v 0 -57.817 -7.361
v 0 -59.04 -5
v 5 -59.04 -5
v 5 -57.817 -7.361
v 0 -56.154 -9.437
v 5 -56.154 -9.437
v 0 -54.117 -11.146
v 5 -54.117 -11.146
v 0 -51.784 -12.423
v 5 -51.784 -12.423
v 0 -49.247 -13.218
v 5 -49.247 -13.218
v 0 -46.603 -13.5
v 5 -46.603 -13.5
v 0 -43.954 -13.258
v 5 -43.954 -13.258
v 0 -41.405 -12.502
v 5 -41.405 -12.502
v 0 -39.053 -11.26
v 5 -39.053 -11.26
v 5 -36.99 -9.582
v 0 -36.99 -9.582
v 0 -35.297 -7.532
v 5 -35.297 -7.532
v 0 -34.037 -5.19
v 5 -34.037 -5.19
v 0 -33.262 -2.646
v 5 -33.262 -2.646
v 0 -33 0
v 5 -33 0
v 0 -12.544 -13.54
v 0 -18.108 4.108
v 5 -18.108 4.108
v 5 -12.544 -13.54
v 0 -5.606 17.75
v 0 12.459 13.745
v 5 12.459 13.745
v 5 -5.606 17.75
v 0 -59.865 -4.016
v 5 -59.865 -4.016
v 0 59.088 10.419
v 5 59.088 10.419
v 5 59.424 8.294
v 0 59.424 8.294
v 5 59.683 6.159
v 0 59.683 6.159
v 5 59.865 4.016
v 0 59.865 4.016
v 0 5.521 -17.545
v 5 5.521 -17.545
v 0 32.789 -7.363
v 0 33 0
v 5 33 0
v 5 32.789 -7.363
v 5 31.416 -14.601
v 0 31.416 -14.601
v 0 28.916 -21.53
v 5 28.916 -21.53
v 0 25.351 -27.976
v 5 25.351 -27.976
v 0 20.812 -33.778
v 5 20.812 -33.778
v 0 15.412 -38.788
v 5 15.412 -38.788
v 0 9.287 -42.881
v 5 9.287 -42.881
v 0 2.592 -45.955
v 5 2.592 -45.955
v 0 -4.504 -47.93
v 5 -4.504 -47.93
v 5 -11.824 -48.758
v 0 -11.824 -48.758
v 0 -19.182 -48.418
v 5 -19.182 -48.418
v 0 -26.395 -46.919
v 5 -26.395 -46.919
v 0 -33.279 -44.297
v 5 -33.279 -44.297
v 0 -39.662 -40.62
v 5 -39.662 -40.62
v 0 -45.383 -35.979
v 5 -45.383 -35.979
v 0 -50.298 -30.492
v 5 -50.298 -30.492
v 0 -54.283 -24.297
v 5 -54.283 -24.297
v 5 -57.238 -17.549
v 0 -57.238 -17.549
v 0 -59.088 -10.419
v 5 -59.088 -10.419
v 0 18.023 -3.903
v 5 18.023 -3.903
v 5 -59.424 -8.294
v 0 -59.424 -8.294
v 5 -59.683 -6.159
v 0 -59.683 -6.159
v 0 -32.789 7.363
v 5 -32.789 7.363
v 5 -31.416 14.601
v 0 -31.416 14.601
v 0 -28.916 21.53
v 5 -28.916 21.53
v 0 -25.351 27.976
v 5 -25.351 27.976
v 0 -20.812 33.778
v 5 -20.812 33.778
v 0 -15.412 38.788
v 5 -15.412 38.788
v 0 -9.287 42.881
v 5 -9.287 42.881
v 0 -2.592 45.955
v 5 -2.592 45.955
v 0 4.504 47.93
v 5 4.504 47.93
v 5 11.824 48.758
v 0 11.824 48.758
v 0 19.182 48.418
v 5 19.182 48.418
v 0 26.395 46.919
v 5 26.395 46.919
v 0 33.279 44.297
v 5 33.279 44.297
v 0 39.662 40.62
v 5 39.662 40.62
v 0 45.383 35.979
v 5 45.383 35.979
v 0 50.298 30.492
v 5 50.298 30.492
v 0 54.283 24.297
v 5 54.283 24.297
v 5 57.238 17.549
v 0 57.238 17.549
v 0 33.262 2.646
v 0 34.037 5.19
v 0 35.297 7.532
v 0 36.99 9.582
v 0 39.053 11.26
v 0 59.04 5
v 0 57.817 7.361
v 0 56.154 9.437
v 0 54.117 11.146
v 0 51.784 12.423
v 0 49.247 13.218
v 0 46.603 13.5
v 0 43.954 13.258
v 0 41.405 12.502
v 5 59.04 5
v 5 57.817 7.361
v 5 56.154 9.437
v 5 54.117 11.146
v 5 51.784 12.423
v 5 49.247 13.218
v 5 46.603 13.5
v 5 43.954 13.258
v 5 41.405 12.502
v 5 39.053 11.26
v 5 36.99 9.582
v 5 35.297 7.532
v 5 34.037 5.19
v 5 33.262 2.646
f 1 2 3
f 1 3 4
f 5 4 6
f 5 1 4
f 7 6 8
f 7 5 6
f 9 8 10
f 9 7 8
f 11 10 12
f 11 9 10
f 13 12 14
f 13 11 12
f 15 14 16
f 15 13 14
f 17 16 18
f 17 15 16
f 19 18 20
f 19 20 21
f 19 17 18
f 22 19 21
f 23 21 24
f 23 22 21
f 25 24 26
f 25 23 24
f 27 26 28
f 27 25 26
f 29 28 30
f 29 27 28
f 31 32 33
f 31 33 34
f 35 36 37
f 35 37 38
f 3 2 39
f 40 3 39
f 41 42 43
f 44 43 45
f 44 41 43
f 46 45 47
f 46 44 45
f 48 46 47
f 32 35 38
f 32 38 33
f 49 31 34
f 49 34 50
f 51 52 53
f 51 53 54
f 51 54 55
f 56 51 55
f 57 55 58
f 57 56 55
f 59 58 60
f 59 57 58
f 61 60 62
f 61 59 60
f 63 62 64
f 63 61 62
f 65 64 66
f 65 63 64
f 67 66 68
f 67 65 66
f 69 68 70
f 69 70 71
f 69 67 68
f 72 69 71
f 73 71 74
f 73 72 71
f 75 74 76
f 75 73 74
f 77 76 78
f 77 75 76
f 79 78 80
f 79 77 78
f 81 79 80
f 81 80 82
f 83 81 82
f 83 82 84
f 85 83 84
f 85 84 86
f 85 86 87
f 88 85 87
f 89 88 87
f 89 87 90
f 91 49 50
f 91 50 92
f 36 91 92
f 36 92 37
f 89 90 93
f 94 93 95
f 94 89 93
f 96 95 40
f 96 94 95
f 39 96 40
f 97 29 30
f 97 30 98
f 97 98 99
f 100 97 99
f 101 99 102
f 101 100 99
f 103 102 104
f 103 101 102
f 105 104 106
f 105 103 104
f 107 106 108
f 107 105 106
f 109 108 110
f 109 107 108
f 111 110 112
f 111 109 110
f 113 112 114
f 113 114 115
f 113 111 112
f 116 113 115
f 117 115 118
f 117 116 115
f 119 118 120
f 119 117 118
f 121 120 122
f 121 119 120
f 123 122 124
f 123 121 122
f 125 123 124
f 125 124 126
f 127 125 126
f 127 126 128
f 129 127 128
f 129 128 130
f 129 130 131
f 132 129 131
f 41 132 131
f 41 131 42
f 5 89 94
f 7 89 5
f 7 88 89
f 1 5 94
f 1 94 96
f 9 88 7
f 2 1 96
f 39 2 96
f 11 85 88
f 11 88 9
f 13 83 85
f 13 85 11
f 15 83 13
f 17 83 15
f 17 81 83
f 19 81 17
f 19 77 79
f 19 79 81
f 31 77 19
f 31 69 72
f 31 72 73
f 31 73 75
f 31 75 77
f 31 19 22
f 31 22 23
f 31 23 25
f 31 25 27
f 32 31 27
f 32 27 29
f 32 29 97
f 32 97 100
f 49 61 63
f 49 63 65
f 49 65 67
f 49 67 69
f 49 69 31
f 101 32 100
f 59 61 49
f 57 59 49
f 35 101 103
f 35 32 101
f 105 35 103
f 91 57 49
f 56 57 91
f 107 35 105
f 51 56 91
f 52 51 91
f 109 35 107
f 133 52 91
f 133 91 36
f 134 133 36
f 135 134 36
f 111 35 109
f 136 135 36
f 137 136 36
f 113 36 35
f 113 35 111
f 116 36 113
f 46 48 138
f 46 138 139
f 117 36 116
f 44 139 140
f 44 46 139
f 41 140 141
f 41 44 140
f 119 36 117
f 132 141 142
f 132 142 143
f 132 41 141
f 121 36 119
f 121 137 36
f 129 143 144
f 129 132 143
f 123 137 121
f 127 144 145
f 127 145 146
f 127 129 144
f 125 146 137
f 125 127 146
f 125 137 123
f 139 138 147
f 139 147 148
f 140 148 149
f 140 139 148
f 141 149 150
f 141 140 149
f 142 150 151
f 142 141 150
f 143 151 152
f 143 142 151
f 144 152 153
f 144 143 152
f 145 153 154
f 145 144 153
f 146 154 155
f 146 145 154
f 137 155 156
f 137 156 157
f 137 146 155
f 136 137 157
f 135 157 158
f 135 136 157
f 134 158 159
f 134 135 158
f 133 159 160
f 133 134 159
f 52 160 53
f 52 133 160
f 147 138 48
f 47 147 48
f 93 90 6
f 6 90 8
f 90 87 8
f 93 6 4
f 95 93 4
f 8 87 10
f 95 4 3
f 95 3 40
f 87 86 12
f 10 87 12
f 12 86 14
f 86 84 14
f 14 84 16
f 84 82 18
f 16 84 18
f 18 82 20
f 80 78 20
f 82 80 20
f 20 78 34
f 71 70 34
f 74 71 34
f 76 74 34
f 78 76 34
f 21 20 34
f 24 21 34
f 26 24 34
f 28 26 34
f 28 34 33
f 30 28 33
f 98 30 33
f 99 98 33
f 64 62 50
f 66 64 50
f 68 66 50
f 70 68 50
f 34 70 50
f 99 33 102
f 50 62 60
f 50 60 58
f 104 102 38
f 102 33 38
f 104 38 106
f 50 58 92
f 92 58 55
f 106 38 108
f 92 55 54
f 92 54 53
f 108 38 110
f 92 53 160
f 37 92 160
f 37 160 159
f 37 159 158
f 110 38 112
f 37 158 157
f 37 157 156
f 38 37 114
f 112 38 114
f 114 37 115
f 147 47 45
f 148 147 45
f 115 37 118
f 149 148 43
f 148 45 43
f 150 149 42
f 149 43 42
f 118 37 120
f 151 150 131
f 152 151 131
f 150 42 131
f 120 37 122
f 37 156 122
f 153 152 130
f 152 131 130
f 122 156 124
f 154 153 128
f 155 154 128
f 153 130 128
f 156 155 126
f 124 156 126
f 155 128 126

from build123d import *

# Parameters (mm, degrees)
BOSS_EXTRUDE1_DEPTH = 5
CUT_EXTRUDE1_DEPTH  = 6
CAVITY1_DEPTH       = 5


# Read off the part's stored shape, not the designer's step: Cavity1
with BuildPart() as part:
    # Sketch3 → Boss-Extrude1 (new body)
    with BuildSketch(Plane(origin=(0, 0, 0), x_dir=(0, 0, -1), z_dir=(1, 0, 0))):
        with BuildLine():
            ThreePointArc((0, 60), (-13.5, 46.5), (0, 33))
            ThreePointArc((0, 33), (48.489461609, -8.147530745), (10.41889066, -59.088465181))
            ThreePointArc((10.41889066, -59.088465181), (5.229344565, -59.771681886), (0, -60))
            ThreePointArc((0, -60), (13.5, -46.5), (0, -33))
            ThreePointArc((0, -33), (-48.489461609, 8.147530745), (-10.41889066, 59.088465181))
            ThreePointArc((-10.41889066, 59.088465181), (-5.229344565, 59.771681886), (0, 60))
        make_face()
    extrude(amount=BOSS_EXTRUDE1_DEPTH)

    # Sketch5 → Cut-Extrude1 (cut)
    with BuildSketch(Plane(origin=(0, 0, 0), x_dir=(0, 0, -1), z_dir=(1, 0, 0))):
        Polygon((-5, 59.039936204), (0, 63.23543436), (4.195498156, 58.23543436), (-0.804501844, 54.039936204), align=None)
        Polygon((5, -59.039936204), (0, -63.23543436), (-4.195498156, -58.23543436), (0.804501844, -54.039936204), align=None)
    extrude(amount=CUT_EXTRUDE1_DEPTH, mode=Mode.SUBTRACT)

    # Cavity1 outline → Cavity1 (cut)
    with BuildSketch(Plane.YZ):
        Polygon((-18.108015498, 4.108286468), (-12.544428042, -13.539583883), (5.520869734, -17.545310986), (18.022580053, -3.903167737), (12.458992597, 13.744702615), (-5.606305179, 17.750429717), align=None)
    extrude(amount=CAVITY1_DEPTH, mode=Mode.SUBTRACT)


solid = part.part
